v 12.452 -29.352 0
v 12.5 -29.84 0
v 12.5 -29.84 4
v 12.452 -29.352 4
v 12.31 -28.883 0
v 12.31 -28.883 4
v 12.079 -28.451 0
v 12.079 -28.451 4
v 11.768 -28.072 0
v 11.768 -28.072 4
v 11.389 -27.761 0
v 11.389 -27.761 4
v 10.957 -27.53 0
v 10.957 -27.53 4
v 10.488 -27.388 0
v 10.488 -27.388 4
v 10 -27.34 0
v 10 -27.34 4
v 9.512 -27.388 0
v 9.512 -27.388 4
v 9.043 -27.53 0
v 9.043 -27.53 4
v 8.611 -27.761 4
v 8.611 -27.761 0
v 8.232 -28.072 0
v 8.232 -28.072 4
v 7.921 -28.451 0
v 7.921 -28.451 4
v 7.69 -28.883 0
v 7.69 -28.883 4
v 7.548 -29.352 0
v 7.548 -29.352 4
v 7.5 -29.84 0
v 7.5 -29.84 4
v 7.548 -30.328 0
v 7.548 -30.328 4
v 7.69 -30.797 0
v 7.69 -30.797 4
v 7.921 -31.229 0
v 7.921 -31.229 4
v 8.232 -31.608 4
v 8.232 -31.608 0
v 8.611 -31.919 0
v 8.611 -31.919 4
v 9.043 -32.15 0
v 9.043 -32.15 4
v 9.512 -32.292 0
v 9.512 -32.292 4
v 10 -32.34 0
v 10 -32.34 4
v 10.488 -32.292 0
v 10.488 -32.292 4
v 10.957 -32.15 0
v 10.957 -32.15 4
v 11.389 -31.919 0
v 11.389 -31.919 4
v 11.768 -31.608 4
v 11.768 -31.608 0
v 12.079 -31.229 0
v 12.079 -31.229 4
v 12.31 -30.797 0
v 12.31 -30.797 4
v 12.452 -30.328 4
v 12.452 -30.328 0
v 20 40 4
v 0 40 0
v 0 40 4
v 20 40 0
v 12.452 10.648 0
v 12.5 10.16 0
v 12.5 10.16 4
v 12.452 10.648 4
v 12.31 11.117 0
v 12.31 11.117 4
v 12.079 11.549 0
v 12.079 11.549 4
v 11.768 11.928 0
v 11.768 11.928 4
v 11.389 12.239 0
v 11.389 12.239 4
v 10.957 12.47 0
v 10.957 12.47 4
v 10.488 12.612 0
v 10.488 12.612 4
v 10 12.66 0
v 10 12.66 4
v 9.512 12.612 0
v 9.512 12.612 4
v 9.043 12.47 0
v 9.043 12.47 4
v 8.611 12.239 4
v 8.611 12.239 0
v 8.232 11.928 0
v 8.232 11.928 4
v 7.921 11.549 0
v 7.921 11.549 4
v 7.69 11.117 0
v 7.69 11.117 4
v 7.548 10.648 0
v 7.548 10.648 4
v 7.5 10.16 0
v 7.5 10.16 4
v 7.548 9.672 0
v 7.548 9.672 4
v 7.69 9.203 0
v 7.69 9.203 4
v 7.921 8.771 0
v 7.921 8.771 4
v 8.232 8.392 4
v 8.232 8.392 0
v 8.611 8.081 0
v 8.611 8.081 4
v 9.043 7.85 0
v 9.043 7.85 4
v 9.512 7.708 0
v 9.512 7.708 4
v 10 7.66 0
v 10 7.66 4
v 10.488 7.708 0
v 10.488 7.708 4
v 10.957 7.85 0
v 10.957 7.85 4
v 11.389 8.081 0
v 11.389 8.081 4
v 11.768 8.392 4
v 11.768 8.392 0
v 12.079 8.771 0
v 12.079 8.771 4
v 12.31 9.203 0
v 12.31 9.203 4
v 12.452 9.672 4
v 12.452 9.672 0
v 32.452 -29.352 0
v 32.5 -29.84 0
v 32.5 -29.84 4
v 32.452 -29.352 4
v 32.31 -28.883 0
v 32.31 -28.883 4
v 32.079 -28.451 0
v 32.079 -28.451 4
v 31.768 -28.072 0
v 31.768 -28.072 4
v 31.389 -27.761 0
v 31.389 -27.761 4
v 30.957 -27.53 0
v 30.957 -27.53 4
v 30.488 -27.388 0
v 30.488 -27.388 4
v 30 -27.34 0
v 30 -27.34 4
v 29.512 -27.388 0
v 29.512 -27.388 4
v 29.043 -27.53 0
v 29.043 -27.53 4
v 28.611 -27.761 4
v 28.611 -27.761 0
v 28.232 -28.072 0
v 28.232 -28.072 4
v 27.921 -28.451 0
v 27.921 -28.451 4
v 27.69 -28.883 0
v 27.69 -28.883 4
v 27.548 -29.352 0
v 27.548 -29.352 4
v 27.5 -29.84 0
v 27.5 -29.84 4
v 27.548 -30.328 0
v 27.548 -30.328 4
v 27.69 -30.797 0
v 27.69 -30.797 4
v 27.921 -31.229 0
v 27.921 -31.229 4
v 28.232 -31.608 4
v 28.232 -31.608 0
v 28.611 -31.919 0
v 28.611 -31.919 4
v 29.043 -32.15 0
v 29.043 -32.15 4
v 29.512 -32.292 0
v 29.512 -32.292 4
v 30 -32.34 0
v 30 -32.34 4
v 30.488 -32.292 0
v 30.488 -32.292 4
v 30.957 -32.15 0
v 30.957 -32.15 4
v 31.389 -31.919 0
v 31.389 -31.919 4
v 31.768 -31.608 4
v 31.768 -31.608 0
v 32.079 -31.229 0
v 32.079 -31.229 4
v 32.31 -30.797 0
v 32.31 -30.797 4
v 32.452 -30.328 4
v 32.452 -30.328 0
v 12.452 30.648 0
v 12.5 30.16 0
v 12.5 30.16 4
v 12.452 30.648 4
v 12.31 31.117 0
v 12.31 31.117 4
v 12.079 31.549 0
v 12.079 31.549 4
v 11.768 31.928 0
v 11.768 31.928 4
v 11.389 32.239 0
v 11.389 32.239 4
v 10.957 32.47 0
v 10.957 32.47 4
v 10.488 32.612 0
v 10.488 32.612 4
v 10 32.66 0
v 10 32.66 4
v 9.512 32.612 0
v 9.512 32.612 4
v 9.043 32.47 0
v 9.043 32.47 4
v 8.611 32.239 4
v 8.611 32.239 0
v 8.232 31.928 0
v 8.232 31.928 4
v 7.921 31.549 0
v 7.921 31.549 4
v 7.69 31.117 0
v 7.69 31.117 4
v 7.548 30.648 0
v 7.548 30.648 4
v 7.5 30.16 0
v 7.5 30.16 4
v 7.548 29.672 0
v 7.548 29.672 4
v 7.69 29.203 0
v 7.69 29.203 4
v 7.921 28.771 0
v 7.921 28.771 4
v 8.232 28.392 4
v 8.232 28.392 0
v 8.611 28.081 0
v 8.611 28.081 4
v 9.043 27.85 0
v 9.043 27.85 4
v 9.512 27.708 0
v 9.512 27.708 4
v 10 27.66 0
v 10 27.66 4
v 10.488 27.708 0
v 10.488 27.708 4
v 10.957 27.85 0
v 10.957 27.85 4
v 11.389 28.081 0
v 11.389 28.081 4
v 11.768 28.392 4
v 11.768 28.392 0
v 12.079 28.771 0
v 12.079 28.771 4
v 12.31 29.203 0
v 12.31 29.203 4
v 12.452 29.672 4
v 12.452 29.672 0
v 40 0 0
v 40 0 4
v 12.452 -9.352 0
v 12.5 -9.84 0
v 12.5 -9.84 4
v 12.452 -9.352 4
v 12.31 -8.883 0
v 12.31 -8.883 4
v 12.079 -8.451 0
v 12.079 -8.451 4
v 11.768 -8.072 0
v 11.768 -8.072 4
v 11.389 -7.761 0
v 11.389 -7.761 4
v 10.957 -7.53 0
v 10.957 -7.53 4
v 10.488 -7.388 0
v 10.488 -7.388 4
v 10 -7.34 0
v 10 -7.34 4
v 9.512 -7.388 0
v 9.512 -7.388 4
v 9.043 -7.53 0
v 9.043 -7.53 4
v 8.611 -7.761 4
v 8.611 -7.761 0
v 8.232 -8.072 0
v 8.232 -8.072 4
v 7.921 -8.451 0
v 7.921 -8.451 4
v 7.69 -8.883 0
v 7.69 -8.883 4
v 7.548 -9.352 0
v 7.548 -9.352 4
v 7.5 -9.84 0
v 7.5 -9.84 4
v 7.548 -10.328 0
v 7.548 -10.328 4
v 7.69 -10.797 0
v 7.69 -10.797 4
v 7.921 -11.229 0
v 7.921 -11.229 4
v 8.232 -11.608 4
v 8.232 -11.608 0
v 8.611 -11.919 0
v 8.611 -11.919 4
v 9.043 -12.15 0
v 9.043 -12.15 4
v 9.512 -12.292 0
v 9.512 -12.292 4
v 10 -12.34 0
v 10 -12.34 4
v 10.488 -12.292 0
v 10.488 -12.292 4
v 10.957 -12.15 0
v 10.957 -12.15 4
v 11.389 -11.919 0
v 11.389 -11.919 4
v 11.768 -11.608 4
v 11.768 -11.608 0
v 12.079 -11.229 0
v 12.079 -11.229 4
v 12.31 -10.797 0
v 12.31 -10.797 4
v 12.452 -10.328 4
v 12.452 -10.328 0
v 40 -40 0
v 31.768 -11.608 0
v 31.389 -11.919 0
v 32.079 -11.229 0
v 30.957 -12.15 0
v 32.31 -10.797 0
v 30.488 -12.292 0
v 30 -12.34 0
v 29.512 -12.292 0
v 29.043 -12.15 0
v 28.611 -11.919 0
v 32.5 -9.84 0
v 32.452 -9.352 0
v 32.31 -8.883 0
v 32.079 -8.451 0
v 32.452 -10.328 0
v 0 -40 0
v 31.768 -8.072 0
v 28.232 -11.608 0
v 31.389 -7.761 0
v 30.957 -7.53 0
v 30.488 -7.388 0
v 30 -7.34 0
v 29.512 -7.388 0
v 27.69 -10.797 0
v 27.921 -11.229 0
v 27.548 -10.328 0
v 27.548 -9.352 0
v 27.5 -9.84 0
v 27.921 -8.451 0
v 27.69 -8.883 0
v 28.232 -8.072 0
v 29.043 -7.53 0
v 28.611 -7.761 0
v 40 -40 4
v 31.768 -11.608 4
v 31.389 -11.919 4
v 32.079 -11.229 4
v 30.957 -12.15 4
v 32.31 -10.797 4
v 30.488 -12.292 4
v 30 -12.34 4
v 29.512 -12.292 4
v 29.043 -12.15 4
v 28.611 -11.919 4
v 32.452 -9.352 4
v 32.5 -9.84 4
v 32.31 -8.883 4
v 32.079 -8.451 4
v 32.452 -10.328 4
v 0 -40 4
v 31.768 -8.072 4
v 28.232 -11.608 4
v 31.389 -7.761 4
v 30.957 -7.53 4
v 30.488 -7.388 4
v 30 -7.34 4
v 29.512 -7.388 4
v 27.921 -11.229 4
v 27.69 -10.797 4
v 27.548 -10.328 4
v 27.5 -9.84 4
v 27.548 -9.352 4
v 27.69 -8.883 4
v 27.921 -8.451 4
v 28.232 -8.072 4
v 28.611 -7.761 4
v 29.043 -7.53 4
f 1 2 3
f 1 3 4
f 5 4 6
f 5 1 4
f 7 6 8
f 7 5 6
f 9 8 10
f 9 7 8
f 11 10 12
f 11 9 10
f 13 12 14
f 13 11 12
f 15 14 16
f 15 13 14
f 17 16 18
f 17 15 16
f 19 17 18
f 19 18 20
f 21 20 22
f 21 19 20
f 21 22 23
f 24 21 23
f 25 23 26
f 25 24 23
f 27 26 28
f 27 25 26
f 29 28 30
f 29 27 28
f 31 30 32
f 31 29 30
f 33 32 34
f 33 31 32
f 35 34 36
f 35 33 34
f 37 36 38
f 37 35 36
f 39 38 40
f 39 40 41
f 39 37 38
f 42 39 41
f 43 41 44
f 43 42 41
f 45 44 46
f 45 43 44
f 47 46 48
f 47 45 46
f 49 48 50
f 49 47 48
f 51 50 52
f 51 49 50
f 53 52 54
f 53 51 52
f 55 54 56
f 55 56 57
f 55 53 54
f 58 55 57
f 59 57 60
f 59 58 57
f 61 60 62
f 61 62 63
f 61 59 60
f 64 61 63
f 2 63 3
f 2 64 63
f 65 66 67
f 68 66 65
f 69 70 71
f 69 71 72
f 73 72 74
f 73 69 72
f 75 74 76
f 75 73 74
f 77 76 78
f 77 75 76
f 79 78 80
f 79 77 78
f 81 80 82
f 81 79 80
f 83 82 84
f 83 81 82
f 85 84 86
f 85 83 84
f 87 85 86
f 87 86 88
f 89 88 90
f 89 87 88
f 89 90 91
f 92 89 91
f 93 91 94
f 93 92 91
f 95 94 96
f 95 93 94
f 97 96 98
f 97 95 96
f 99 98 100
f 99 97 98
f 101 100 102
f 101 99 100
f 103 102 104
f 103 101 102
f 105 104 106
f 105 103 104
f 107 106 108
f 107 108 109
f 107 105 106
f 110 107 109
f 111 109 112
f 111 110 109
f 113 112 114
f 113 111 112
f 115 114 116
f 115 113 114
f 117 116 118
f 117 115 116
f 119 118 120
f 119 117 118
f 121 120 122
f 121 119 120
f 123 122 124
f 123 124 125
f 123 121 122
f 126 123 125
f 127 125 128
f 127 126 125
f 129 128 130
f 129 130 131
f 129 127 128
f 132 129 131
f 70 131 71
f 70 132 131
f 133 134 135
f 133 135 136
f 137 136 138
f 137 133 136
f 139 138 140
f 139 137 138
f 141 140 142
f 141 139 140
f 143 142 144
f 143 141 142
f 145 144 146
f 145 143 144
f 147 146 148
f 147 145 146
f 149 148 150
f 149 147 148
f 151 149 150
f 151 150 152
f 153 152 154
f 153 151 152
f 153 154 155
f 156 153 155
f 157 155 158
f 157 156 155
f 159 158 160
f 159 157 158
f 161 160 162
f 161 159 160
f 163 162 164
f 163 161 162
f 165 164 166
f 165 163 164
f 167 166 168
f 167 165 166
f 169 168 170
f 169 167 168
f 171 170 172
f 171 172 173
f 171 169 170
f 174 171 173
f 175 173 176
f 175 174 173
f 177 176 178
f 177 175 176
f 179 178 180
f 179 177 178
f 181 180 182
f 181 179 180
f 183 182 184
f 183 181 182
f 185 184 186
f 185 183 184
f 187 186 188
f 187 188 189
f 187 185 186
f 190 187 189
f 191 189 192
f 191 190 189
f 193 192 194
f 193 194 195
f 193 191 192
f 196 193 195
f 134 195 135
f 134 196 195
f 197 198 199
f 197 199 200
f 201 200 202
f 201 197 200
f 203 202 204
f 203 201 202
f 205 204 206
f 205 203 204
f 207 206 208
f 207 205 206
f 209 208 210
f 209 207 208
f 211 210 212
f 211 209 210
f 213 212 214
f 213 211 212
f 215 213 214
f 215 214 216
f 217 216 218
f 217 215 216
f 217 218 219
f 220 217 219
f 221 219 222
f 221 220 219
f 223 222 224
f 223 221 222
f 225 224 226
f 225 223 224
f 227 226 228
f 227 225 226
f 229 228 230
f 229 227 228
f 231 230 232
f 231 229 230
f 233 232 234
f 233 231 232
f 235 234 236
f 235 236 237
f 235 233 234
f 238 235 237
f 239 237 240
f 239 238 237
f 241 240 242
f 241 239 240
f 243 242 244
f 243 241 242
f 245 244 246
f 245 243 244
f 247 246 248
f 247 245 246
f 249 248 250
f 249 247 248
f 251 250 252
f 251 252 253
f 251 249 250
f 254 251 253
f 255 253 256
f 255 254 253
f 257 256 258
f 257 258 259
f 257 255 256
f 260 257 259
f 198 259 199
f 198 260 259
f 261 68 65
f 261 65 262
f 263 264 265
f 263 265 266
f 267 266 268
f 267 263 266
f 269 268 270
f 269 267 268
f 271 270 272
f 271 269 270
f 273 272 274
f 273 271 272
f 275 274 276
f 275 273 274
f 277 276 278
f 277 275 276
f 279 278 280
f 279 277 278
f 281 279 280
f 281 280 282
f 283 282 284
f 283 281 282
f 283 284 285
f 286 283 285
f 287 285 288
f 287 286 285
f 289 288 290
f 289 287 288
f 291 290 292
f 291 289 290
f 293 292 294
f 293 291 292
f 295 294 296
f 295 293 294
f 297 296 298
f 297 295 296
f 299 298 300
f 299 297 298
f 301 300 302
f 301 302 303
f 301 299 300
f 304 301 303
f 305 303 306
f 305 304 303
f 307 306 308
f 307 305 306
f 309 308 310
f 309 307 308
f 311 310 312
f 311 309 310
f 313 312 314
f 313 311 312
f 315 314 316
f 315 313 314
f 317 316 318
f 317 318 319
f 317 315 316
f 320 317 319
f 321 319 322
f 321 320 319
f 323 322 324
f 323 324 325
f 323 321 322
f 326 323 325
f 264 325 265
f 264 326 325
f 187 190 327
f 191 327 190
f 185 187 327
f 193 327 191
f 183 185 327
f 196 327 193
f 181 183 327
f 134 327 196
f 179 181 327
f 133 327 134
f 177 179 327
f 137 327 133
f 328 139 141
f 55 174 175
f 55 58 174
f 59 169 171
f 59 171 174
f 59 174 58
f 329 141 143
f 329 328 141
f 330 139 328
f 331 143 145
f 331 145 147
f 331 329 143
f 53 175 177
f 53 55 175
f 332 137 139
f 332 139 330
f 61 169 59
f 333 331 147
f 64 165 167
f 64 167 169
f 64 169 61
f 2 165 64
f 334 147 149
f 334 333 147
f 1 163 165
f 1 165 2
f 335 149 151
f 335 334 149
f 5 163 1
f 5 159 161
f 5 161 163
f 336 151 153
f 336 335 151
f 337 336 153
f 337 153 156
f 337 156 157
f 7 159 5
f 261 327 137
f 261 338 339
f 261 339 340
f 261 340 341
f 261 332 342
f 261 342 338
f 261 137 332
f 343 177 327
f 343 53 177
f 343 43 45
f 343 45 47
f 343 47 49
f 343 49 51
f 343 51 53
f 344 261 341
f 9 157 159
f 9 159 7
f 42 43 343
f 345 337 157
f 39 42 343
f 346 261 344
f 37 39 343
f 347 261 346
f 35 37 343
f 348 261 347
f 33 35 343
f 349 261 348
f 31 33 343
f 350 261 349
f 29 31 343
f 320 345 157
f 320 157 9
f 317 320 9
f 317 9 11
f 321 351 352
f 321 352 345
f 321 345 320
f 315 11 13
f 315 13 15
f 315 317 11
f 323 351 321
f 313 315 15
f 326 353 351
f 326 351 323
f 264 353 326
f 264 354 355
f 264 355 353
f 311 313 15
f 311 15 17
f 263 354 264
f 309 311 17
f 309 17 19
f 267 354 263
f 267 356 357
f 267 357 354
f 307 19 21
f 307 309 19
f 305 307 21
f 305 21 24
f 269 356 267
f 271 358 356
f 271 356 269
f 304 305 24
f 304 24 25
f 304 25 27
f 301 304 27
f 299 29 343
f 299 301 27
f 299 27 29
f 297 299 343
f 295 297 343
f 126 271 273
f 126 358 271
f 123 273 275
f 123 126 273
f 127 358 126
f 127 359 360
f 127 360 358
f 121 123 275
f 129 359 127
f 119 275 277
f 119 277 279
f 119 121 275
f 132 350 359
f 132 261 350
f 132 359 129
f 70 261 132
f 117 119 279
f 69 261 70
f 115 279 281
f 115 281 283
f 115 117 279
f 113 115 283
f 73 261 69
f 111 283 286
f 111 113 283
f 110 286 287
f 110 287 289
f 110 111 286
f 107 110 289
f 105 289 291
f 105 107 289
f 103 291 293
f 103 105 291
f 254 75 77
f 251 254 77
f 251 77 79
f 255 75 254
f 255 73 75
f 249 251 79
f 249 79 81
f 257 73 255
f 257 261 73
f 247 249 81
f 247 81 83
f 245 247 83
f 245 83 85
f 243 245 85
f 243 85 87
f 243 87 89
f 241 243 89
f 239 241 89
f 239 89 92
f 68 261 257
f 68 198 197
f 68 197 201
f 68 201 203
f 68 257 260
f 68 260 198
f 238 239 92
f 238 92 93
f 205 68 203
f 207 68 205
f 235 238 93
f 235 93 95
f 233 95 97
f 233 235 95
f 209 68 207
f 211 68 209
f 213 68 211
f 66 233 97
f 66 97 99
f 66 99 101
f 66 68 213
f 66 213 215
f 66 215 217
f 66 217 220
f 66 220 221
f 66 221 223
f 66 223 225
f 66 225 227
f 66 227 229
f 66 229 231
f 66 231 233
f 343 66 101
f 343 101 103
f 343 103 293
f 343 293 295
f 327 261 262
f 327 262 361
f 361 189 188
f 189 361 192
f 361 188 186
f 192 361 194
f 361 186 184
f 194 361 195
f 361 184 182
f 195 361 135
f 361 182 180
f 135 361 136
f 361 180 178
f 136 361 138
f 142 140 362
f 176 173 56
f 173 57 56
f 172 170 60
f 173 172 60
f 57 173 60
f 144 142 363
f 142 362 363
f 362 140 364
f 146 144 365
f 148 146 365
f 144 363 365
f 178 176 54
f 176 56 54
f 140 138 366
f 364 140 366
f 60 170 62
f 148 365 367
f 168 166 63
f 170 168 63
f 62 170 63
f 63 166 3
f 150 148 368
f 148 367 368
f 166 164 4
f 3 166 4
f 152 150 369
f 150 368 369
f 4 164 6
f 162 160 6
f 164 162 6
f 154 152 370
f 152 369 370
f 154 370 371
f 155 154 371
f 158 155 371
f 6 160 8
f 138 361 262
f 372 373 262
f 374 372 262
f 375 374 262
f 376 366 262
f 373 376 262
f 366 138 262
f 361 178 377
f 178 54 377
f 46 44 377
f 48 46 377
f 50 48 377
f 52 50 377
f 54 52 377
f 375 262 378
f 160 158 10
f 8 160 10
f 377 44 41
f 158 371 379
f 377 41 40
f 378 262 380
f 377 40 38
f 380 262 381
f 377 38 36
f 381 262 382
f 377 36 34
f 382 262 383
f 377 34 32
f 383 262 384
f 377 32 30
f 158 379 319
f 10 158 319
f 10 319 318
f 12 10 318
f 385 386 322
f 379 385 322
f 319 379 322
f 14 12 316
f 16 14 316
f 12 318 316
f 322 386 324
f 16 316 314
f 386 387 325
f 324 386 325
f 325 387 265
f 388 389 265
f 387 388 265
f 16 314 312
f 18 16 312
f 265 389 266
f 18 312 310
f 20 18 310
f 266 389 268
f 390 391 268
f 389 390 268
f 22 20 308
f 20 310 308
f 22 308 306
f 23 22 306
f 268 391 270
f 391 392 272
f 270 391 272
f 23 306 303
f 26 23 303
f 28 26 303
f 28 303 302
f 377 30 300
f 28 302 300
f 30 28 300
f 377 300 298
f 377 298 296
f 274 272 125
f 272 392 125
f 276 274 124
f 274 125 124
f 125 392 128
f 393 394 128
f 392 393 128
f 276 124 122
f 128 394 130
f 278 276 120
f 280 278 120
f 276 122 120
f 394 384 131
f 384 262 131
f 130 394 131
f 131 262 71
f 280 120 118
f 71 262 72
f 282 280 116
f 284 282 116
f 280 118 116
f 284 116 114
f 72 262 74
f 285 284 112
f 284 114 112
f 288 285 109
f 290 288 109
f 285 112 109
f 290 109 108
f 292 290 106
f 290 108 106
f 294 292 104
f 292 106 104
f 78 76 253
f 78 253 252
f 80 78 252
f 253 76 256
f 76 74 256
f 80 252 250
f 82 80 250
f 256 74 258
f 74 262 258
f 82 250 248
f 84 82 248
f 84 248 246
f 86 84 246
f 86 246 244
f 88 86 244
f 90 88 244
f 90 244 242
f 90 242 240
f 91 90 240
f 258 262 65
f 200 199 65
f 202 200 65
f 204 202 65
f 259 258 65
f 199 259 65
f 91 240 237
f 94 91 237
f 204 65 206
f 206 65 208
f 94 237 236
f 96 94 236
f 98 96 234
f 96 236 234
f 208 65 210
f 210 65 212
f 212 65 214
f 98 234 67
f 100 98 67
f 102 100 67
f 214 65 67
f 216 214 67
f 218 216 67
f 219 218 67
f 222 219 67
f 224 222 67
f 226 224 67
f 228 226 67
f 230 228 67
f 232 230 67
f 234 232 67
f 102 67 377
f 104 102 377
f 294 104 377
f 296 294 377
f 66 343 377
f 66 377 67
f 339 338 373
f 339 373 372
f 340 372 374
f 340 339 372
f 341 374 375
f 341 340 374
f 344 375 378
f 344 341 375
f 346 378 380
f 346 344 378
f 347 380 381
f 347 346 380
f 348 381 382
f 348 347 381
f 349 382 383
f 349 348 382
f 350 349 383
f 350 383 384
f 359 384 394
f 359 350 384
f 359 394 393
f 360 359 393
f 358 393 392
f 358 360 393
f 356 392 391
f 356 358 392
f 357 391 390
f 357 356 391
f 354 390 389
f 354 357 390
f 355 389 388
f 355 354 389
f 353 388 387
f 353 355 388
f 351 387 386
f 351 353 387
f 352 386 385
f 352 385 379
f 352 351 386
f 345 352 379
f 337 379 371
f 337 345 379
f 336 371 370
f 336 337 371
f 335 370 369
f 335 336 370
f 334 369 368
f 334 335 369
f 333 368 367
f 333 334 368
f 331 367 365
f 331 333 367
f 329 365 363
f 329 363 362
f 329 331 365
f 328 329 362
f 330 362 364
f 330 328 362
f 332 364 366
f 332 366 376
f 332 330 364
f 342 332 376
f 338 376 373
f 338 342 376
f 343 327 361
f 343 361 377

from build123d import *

# Parameters (mm, degrees)
SKETCH1_R           = 2.5
BOSS_EXTRUDE1_DEPTH = 4


with BuildPart() as part:
    # Sketch1 → Boss-Extrude1 (new body)
    with BuildSketch(Plane.XY):
        Polygon((0, -40), (0, 40), (20, 40), (40, 0), (40, -40), align=None)
        with Locations((10, -29.84)):
            Circle(SKETCH1_R, mode=Mode.SUBTRACT)
        with Locations((30, -29.84)):
            Circle(SKETCH1_R, mode=Mode.SUBTRACT)
        with Locations((10, -9.84)):
            Circle(SKETCH1_R, mode=Mode.SUBTRACT)
        with Locations((10, 10.16)):
            Circle(SKETCH1_R, mode=Mode.SUBTRACT)
        with Locations((10, 30.16)):
            Circle(SKETCH1_R, mode=Mode.SUBTRACT)
        with Locations((30, -9.84)):
            Circle(SKETCH1_R, mode=Mode.SUBTRACT)
    extrude(amount=BOSS_EXTRUDE1_DEPTH)


solid = part.part
